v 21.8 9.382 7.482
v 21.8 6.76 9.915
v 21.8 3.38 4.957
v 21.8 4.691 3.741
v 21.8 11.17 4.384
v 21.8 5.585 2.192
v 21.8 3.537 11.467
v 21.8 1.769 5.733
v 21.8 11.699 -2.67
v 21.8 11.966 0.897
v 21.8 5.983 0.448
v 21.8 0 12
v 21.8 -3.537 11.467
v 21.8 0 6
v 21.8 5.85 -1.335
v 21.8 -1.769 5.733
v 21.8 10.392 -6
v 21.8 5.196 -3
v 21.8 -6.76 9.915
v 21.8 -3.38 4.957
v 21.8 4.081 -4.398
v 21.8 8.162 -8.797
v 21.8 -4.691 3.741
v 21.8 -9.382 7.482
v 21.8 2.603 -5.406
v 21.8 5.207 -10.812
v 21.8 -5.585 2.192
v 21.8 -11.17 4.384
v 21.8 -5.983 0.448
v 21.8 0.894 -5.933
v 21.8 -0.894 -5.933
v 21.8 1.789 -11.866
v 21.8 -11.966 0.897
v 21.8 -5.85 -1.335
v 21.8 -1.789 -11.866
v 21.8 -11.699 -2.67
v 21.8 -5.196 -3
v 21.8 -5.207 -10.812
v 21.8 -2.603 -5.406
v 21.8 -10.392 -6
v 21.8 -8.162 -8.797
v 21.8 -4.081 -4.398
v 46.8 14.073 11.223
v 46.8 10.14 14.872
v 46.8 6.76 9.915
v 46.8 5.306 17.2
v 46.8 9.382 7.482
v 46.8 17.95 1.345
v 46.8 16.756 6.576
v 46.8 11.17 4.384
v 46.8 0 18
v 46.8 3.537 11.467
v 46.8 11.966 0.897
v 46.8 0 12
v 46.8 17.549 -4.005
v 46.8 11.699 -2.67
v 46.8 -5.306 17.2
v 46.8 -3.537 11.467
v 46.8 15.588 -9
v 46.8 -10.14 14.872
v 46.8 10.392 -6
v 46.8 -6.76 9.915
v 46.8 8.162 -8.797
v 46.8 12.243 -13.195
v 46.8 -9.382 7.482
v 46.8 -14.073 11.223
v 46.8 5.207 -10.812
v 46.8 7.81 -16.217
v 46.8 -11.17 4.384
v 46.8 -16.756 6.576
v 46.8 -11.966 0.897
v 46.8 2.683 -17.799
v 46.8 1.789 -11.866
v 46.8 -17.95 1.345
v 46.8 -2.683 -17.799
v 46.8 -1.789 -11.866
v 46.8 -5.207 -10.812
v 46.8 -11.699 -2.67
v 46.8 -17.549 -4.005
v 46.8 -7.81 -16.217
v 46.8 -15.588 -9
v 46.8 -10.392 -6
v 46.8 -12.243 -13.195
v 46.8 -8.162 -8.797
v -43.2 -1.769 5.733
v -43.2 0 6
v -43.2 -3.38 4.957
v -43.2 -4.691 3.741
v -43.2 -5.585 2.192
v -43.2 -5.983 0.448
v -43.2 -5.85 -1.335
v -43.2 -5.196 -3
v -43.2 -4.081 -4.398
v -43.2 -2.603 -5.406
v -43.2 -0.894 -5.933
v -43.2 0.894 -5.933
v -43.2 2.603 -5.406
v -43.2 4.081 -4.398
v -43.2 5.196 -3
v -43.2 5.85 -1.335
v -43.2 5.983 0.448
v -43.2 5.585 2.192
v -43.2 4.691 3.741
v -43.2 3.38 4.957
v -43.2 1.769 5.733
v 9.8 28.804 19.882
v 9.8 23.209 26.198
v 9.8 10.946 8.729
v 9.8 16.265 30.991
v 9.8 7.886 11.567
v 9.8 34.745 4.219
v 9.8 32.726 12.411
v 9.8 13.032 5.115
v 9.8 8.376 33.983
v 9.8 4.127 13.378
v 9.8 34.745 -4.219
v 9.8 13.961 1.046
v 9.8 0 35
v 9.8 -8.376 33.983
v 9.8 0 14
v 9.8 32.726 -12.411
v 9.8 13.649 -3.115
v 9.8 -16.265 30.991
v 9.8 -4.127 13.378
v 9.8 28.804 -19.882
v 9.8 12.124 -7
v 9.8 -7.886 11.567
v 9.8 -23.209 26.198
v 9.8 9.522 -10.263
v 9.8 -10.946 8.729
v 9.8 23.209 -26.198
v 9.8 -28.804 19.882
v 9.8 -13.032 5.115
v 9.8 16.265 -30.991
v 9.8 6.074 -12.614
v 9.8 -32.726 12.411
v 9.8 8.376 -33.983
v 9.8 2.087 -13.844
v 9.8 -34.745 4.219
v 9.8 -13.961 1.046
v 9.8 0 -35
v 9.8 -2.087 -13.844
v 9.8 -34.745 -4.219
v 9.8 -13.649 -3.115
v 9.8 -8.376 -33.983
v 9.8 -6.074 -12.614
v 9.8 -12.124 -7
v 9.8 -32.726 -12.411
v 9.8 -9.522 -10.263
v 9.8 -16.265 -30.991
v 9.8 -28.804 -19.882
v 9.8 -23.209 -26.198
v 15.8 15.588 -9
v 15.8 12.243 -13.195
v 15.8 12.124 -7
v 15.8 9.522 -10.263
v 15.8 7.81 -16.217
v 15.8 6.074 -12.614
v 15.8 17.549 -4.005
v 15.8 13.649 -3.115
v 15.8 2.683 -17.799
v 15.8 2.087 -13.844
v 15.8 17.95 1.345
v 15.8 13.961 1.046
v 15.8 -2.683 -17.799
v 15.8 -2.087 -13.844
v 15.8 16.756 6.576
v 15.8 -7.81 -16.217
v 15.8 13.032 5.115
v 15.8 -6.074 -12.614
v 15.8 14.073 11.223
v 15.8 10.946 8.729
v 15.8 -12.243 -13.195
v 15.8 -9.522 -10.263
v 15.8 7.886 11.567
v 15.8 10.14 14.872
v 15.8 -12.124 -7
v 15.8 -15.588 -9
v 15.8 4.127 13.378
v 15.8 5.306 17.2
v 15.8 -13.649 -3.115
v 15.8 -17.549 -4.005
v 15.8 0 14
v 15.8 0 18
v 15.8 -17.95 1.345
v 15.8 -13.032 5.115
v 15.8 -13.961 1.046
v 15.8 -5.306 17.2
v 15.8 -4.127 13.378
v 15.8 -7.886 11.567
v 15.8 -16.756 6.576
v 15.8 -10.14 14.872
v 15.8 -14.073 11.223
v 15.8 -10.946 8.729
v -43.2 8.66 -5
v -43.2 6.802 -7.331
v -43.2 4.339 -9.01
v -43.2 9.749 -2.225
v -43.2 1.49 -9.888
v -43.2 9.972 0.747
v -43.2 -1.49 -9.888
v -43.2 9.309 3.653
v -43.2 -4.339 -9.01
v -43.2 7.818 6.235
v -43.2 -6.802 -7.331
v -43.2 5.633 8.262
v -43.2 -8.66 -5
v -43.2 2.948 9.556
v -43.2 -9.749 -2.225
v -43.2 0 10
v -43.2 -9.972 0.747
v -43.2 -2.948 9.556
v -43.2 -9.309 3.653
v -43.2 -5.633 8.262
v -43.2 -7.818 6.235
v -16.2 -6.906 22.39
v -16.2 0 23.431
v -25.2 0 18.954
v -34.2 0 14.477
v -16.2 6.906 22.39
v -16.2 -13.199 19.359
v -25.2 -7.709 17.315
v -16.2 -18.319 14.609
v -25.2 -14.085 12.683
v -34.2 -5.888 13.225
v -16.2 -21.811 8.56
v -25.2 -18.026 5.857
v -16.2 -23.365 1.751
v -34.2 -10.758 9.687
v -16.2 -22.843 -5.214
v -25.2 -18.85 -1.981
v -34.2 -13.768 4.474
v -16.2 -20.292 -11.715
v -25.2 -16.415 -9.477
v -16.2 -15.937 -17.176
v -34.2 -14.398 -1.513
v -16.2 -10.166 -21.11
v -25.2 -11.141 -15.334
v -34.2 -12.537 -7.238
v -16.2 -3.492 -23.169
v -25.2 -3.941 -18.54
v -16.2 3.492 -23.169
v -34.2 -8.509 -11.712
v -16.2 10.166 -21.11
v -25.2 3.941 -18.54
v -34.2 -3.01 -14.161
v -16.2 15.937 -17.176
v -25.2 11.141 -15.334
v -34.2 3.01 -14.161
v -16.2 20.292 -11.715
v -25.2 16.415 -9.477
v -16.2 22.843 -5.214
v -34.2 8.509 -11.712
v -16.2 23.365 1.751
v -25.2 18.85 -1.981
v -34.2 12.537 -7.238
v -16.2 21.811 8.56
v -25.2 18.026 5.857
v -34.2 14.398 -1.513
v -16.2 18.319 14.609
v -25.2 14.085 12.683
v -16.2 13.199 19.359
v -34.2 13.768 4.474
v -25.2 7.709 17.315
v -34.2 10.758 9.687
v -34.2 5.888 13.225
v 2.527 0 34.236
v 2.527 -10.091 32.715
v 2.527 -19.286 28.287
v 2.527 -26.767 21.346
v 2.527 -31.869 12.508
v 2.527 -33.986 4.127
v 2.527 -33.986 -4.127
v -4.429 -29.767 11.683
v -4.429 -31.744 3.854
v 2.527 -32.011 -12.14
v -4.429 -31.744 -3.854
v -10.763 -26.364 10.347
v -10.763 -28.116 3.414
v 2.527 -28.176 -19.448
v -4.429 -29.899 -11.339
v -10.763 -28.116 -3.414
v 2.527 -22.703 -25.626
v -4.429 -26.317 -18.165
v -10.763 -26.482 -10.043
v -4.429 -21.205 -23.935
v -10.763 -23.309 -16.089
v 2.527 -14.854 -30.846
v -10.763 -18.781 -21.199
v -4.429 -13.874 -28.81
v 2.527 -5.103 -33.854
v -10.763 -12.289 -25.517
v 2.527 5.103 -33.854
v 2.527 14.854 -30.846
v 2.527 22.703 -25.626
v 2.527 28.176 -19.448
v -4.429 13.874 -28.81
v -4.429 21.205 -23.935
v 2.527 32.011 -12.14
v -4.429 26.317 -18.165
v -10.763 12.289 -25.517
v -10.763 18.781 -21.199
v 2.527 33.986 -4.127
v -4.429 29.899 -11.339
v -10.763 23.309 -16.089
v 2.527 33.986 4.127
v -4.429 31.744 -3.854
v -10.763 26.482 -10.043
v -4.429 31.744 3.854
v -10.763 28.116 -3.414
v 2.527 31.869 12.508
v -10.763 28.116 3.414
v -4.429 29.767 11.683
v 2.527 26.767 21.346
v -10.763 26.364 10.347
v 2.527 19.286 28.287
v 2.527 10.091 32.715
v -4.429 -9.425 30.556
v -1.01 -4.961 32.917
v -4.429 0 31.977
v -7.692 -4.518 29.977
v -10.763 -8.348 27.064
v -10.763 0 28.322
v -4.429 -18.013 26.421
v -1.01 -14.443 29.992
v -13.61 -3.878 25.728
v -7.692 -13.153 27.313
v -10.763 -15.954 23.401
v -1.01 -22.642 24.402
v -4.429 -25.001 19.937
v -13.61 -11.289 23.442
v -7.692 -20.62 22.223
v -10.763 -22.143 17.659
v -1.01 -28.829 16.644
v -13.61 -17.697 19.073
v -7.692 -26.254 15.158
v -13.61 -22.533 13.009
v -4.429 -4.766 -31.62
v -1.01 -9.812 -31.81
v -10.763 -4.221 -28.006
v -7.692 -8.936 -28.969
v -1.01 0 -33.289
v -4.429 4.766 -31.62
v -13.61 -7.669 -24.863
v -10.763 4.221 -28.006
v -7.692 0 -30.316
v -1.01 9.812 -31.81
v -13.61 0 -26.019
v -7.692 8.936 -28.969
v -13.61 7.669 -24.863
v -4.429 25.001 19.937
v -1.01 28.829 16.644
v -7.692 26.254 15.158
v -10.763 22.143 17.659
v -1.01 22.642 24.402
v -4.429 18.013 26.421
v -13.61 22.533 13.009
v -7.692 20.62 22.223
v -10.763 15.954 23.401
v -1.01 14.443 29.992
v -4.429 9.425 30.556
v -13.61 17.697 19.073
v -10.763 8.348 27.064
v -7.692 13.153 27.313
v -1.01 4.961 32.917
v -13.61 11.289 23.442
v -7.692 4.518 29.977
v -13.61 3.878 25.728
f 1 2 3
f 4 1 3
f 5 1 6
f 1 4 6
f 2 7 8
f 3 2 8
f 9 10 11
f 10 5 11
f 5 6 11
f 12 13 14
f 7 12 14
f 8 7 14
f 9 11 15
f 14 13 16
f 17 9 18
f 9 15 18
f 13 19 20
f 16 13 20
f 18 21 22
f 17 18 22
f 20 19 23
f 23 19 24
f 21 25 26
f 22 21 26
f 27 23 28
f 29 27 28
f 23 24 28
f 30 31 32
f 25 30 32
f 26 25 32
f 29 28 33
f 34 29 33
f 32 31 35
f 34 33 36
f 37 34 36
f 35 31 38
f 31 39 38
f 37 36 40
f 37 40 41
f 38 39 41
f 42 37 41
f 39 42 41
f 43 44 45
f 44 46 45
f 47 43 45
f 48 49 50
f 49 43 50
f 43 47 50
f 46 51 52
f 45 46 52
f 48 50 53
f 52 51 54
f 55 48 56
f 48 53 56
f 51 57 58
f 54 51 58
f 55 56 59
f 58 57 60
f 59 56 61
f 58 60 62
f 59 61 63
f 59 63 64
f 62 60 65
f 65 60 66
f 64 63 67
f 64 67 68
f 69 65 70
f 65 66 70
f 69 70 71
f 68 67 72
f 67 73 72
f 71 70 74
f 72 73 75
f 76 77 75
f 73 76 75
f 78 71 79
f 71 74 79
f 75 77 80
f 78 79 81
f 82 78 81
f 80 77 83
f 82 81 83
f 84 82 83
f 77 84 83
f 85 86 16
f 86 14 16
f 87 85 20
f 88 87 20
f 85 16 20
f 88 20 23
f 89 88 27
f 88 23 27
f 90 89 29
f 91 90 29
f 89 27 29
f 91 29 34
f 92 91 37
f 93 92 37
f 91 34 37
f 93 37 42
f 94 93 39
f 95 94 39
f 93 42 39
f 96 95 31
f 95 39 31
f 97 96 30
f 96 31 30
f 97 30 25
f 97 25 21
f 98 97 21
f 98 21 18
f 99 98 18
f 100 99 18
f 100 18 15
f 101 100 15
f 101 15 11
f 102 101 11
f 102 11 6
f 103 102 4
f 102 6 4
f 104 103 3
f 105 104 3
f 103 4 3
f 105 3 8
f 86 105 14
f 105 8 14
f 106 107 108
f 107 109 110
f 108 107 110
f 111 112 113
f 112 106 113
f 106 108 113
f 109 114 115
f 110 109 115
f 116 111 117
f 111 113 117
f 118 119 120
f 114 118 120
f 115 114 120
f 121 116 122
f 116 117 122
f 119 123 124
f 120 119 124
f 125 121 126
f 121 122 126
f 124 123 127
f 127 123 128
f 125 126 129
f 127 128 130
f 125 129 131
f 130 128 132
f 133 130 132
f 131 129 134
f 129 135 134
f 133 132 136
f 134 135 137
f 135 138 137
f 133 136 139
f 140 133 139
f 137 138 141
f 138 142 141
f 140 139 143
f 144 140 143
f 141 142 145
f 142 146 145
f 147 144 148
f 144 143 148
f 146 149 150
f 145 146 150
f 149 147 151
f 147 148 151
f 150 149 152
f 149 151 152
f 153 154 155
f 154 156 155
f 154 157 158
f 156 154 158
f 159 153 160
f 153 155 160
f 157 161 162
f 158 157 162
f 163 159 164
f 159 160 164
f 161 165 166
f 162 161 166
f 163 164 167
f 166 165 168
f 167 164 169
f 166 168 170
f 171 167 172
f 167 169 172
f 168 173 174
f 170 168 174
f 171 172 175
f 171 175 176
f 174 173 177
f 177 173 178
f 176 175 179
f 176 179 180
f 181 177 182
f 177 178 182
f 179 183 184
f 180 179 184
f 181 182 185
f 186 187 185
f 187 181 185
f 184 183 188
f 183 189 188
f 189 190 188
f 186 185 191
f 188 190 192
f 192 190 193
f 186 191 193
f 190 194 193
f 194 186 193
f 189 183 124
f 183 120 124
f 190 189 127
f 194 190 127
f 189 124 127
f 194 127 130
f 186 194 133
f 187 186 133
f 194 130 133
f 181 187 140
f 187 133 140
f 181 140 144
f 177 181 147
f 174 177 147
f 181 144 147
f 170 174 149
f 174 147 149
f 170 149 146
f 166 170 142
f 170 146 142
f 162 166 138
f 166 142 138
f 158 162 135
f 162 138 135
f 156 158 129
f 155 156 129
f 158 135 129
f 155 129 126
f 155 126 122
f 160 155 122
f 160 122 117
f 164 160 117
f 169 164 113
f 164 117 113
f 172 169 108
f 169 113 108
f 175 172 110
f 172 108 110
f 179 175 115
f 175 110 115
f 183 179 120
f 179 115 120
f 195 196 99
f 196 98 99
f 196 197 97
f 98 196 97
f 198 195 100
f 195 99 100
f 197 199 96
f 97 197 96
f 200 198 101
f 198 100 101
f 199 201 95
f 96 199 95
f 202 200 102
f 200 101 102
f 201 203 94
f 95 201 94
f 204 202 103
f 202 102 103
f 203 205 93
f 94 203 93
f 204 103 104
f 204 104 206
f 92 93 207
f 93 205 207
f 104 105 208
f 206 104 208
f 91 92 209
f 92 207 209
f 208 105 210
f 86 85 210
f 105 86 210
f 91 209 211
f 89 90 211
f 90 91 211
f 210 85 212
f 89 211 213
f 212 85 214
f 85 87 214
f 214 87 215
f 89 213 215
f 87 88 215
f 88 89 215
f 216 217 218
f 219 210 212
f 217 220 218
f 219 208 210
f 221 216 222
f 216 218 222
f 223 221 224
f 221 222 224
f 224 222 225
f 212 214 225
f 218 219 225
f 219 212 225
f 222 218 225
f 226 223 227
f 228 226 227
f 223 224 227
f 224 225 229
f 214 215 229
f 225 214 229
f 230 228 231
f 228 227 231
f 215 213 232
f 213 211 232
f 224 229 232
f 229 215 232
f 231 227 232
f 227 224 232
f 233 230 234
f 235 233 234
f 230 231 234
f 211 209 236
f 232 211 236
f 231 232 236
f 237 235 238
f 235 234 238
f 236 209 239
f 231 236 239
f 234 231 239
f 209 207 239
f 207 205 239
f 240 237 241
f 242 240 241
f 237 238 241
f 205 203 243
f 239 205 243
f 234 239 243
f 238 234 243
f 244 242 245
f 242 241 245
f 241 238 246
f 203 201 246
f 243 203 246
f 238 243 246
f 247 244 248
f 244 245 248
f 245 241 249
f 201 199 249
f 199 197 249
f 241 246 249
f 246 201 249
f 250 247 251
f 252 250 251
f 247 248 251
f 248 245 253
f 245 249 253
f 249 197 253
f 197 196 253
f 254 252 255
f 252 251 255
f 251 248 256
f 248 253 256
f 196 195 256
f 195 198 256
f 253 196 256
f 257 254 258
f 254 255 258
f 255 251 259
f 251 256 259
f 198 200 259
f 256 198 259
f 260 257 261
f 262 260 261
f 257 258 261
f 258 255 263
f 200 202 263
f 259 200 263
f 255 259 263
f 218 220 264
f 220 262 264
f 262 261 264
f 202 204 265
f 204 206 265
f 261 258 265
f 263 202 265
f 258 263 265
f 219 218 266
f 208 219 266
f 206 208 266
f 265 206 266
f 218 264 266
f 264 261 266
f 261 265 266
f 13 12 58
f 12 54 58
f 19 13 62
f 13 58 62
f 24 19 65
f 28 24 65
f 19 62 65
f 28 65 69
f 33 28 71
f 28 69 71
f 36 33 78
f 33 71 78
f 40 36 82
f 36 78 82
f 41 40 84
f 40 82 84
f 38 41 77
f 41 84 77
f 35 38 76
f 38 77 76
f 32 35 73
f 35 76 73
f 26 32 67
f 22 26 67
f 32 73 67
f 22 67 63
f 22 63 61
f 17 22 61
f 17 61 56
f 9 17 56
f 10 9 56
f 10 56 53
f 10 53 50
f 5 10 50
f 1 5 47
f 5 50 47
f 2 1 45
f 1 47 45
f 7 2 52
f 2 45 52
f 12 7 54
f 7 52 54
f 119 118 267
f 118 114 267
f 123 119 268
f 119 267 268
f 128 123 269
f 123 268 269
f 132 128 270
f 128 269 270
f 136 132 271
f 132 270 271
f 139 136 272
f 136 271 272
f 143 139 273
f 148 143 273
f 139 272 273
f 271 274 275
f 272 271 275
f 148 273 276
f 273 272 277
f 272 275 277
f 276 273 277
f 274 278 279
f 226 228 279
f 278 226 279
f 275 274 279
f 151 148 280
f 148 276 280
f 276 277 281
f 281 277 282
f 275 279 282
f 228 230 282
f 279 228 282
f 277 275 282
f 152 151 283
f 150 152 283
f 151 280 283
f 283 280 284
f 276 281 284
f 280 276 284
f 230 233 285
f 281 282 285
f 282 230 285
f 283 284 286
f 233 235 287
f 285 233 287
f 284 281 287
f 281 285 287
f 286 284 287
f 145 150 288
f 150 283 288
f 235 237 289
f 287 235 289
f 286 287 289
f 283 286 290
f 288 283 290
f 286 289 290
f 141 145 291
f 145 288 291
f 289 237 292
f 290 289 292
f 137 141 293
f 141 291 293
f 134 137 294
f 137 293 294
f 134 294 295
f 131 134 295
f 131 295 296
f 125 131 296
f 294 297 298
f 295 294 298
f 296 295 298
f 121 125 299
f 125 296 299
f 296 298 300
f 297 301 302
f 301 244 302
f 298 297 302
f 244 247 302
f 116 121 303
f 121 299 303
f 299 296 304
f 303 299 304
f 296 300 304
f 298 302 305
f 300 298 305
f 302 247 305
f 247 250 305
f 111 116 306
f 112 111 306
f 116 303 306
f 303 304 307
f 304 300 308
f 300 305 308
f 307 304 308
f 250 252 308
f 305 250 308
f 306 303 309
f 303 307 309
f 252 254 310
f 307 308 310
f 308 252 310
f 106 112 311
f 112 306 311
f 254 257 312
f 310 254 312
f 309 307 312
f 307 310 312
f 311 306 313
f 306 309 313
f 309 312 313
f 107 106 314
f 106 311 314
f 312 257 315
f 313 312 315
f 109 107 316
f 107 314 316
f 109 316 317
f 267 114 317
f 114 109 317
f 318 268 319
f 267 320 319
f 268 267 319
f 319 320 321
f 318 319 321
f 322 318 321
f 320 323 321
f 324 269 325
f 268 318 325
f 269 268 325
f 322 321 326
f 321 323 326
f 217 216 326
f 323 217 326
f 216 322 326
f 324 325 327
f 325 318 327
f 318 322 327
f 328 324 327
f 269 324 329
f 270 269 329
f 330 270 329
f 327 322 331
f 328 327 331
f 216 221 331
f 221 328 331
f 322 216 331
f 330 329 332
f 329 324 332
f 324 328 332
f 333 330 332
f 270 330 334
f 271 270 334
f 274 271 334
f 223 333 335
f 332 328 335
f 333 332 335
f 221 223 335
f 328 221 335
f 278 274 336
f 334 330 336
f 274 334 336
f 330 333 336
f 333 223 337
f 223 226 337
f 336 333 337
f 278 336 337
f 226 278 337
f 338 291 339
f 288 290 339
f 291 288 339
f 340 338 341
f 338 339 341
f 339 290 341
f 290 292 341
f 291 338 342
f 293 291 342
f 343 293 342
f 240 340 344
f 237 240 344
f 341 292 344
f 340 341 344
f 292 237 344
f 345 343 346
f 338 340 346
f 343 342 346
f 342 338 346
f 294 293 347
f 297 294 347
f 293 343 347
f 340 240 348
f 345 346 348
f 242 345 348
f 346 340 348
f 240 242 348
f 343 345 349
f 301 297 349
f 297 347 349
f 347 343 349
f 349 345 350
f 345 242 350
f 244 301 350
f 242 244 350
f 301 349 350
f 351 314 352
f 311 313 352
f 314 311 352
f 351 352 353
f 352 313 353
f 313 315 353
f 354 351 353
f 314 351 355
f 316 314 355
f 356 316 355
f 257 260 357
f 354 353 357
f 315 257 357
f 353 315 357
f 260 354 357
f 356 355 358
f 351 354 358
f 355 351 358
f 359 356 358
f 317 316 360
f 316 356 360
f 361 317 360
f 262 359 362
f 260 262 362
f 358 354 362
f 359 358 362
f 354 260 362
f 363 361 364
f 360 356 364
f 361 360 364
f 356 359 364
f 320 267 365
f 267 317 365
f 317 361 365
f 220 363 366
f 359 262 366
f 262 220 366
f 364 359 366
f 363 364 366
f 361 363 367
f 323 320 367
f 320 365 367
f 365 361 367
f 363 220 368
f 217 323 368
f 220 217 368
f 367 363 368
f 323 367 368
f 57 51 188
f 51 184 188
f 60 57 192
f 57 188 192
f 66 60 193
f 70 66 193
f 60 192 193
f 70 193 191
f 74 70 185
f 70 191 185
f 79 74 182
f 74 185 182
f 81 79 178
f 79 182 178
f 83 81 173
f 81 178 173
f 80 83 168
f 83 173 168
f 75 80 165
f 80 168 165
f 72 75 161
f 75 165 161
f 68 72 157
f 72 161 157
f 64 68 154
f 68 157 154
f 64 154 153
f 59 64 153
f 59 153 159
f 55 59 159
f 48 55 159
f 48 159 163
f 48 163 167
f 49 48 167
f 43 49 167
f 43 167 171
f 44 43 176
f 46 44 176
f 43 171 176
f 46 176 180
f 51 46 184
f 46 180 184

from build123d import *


with BuildPart() as f1:
    # F0 (on Front) → F1 (revolve)
    with BuildSketch(Plane.XZ):
        with BuildLine():
            Line((-43.2, 10), (-43.2, 6))
            Line((-43.2, 6), (21.8, 6))
            Line((21.8, 6), (21.8, 12))
            Line((21.8, 12), (46.8, 12))
            Line((46.8, 12), (46.8, 18))
            Line((46.8, 18), (15.8, 18))
            Line((15.8, 18), (15.8, 14))
            Line((15.8, 14), (9.8, 14))
            Line((9.8, 14), (9.8, 35))
            ThreePointArc((9.8, 35), (-4.42891, 31.97715), (-16.2, 23.430749))
            Line((-16.2, 23.430749), (-43.2, 10))
        make_face()
    revolve(axis=Axis((-0.3, 0, 0), (1, 0, 0)))


solid = f1.part
